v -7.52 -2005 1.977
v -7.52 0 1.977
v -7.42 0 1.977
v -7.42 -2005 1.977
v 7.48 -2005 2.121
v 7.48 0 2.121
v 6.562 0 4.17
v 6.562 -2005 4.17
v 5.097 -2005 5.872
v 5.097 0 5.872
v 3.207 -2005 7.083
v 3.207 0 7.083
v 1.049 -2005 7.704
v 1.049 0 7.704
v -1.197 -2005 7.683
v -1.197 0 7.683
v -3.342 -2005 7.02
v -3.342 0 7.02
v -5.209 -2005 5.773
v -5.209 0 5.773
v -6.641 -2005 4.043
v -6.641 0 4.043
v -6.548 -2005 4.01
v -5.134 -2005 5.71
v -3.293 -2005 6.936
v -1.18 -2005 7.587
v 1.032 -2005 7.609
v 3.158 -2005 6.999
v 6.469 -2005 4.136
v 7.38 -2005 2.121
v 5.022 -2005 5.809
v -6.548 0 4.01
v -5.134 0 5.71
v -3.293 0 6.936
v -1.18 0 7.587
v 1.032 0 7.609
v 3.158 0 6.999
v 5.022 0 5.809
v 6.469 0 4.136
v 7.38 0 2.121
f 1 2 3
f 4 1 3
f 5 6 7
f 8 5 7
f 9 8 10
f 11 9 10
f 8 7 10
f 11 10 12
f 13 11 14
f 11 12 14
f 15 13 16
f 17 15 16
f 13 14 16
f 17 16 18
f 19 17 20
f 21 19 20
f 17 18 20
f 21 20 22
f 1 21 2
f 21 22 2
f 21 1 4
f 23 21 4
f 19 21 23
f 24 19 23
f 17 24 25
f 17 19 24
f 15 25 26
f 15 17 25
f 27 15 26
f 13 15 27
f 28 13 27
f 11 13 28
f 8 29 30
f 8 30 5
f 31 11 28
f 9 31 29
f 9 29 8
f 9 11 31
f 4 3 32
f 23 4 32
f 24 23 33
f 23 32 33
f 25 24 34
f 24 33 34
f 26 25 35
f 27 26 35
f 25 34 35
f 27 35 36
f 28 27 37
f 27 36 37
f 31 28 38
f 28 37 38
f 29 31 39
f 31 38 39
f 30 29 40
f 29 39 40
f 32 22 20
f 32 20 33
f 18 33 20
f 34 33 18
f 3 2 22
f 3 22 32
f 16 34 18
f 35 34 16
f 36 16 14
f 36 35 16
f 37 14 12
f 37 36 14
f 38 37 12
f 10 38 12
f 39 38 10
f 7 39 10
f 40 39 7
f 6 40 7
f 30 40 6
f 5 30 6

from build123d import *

# Parameters (mm, degrees)
SKETCH1_W           = 90
SKETCH1_H           = 90
BOSS_EXTRUDE1_DEPTH = 5
BOSS_EXTRUDE2_DEPTH = 2005
SKETCH3_W           = 90
SKETCH3_H           = 90
CUT_EXTRUDE3_DEPTH  = 5


with BuildPart() as part:
    # Sketch1 → Boss-Extrude1 (new body)
    with BuildSketch(Plane(origin=(0, 0, 0), x_dir=(1, 0, 0), z_dir=(0, 1, 0))):
        Rectangle(SKETCH1_W, SKETCH1_H)
    extrude(amount=BOSS_EXTRUDE1_DEPTH)

    # Sketch2 → Boss-Extrude2 (add)
    with BuildSketch(Plane.XZ):
        with BuildLine():
            Line((-7.519680062, 1.976929803), (-7.419680062, 1.976929803))
            ThreePointArc((-7.419680062, 1.976929803), (-0.074747151, 7.678171432), (7.379786606, 2.121002904))
            Line((7.379786606, 2.121002904), (7.480319938, 2.121002904))
            ThreePointArc((7.480319938, 2.121002904), (-0.074676432, 7.774848109), (-7.519680062, 1.976929803))
        make_face()
    extrude(amount=BOSS_EXTRUDE2_DEPTH)

    # Sketch3 → Cut-Extrude3 (cut)
    with BuildSketch(Plane(origin=(0, 5, 0), x_dir=(1, 0, 0), z_dir=(0, 1, 0))):
        Rectangle(SKETCH3_W, SKETCH3_H)
    extrude(amount=-CUT_EXTRUDE3_DEPTH, mode=Mode.SUBTRACT)


solid = part.part
